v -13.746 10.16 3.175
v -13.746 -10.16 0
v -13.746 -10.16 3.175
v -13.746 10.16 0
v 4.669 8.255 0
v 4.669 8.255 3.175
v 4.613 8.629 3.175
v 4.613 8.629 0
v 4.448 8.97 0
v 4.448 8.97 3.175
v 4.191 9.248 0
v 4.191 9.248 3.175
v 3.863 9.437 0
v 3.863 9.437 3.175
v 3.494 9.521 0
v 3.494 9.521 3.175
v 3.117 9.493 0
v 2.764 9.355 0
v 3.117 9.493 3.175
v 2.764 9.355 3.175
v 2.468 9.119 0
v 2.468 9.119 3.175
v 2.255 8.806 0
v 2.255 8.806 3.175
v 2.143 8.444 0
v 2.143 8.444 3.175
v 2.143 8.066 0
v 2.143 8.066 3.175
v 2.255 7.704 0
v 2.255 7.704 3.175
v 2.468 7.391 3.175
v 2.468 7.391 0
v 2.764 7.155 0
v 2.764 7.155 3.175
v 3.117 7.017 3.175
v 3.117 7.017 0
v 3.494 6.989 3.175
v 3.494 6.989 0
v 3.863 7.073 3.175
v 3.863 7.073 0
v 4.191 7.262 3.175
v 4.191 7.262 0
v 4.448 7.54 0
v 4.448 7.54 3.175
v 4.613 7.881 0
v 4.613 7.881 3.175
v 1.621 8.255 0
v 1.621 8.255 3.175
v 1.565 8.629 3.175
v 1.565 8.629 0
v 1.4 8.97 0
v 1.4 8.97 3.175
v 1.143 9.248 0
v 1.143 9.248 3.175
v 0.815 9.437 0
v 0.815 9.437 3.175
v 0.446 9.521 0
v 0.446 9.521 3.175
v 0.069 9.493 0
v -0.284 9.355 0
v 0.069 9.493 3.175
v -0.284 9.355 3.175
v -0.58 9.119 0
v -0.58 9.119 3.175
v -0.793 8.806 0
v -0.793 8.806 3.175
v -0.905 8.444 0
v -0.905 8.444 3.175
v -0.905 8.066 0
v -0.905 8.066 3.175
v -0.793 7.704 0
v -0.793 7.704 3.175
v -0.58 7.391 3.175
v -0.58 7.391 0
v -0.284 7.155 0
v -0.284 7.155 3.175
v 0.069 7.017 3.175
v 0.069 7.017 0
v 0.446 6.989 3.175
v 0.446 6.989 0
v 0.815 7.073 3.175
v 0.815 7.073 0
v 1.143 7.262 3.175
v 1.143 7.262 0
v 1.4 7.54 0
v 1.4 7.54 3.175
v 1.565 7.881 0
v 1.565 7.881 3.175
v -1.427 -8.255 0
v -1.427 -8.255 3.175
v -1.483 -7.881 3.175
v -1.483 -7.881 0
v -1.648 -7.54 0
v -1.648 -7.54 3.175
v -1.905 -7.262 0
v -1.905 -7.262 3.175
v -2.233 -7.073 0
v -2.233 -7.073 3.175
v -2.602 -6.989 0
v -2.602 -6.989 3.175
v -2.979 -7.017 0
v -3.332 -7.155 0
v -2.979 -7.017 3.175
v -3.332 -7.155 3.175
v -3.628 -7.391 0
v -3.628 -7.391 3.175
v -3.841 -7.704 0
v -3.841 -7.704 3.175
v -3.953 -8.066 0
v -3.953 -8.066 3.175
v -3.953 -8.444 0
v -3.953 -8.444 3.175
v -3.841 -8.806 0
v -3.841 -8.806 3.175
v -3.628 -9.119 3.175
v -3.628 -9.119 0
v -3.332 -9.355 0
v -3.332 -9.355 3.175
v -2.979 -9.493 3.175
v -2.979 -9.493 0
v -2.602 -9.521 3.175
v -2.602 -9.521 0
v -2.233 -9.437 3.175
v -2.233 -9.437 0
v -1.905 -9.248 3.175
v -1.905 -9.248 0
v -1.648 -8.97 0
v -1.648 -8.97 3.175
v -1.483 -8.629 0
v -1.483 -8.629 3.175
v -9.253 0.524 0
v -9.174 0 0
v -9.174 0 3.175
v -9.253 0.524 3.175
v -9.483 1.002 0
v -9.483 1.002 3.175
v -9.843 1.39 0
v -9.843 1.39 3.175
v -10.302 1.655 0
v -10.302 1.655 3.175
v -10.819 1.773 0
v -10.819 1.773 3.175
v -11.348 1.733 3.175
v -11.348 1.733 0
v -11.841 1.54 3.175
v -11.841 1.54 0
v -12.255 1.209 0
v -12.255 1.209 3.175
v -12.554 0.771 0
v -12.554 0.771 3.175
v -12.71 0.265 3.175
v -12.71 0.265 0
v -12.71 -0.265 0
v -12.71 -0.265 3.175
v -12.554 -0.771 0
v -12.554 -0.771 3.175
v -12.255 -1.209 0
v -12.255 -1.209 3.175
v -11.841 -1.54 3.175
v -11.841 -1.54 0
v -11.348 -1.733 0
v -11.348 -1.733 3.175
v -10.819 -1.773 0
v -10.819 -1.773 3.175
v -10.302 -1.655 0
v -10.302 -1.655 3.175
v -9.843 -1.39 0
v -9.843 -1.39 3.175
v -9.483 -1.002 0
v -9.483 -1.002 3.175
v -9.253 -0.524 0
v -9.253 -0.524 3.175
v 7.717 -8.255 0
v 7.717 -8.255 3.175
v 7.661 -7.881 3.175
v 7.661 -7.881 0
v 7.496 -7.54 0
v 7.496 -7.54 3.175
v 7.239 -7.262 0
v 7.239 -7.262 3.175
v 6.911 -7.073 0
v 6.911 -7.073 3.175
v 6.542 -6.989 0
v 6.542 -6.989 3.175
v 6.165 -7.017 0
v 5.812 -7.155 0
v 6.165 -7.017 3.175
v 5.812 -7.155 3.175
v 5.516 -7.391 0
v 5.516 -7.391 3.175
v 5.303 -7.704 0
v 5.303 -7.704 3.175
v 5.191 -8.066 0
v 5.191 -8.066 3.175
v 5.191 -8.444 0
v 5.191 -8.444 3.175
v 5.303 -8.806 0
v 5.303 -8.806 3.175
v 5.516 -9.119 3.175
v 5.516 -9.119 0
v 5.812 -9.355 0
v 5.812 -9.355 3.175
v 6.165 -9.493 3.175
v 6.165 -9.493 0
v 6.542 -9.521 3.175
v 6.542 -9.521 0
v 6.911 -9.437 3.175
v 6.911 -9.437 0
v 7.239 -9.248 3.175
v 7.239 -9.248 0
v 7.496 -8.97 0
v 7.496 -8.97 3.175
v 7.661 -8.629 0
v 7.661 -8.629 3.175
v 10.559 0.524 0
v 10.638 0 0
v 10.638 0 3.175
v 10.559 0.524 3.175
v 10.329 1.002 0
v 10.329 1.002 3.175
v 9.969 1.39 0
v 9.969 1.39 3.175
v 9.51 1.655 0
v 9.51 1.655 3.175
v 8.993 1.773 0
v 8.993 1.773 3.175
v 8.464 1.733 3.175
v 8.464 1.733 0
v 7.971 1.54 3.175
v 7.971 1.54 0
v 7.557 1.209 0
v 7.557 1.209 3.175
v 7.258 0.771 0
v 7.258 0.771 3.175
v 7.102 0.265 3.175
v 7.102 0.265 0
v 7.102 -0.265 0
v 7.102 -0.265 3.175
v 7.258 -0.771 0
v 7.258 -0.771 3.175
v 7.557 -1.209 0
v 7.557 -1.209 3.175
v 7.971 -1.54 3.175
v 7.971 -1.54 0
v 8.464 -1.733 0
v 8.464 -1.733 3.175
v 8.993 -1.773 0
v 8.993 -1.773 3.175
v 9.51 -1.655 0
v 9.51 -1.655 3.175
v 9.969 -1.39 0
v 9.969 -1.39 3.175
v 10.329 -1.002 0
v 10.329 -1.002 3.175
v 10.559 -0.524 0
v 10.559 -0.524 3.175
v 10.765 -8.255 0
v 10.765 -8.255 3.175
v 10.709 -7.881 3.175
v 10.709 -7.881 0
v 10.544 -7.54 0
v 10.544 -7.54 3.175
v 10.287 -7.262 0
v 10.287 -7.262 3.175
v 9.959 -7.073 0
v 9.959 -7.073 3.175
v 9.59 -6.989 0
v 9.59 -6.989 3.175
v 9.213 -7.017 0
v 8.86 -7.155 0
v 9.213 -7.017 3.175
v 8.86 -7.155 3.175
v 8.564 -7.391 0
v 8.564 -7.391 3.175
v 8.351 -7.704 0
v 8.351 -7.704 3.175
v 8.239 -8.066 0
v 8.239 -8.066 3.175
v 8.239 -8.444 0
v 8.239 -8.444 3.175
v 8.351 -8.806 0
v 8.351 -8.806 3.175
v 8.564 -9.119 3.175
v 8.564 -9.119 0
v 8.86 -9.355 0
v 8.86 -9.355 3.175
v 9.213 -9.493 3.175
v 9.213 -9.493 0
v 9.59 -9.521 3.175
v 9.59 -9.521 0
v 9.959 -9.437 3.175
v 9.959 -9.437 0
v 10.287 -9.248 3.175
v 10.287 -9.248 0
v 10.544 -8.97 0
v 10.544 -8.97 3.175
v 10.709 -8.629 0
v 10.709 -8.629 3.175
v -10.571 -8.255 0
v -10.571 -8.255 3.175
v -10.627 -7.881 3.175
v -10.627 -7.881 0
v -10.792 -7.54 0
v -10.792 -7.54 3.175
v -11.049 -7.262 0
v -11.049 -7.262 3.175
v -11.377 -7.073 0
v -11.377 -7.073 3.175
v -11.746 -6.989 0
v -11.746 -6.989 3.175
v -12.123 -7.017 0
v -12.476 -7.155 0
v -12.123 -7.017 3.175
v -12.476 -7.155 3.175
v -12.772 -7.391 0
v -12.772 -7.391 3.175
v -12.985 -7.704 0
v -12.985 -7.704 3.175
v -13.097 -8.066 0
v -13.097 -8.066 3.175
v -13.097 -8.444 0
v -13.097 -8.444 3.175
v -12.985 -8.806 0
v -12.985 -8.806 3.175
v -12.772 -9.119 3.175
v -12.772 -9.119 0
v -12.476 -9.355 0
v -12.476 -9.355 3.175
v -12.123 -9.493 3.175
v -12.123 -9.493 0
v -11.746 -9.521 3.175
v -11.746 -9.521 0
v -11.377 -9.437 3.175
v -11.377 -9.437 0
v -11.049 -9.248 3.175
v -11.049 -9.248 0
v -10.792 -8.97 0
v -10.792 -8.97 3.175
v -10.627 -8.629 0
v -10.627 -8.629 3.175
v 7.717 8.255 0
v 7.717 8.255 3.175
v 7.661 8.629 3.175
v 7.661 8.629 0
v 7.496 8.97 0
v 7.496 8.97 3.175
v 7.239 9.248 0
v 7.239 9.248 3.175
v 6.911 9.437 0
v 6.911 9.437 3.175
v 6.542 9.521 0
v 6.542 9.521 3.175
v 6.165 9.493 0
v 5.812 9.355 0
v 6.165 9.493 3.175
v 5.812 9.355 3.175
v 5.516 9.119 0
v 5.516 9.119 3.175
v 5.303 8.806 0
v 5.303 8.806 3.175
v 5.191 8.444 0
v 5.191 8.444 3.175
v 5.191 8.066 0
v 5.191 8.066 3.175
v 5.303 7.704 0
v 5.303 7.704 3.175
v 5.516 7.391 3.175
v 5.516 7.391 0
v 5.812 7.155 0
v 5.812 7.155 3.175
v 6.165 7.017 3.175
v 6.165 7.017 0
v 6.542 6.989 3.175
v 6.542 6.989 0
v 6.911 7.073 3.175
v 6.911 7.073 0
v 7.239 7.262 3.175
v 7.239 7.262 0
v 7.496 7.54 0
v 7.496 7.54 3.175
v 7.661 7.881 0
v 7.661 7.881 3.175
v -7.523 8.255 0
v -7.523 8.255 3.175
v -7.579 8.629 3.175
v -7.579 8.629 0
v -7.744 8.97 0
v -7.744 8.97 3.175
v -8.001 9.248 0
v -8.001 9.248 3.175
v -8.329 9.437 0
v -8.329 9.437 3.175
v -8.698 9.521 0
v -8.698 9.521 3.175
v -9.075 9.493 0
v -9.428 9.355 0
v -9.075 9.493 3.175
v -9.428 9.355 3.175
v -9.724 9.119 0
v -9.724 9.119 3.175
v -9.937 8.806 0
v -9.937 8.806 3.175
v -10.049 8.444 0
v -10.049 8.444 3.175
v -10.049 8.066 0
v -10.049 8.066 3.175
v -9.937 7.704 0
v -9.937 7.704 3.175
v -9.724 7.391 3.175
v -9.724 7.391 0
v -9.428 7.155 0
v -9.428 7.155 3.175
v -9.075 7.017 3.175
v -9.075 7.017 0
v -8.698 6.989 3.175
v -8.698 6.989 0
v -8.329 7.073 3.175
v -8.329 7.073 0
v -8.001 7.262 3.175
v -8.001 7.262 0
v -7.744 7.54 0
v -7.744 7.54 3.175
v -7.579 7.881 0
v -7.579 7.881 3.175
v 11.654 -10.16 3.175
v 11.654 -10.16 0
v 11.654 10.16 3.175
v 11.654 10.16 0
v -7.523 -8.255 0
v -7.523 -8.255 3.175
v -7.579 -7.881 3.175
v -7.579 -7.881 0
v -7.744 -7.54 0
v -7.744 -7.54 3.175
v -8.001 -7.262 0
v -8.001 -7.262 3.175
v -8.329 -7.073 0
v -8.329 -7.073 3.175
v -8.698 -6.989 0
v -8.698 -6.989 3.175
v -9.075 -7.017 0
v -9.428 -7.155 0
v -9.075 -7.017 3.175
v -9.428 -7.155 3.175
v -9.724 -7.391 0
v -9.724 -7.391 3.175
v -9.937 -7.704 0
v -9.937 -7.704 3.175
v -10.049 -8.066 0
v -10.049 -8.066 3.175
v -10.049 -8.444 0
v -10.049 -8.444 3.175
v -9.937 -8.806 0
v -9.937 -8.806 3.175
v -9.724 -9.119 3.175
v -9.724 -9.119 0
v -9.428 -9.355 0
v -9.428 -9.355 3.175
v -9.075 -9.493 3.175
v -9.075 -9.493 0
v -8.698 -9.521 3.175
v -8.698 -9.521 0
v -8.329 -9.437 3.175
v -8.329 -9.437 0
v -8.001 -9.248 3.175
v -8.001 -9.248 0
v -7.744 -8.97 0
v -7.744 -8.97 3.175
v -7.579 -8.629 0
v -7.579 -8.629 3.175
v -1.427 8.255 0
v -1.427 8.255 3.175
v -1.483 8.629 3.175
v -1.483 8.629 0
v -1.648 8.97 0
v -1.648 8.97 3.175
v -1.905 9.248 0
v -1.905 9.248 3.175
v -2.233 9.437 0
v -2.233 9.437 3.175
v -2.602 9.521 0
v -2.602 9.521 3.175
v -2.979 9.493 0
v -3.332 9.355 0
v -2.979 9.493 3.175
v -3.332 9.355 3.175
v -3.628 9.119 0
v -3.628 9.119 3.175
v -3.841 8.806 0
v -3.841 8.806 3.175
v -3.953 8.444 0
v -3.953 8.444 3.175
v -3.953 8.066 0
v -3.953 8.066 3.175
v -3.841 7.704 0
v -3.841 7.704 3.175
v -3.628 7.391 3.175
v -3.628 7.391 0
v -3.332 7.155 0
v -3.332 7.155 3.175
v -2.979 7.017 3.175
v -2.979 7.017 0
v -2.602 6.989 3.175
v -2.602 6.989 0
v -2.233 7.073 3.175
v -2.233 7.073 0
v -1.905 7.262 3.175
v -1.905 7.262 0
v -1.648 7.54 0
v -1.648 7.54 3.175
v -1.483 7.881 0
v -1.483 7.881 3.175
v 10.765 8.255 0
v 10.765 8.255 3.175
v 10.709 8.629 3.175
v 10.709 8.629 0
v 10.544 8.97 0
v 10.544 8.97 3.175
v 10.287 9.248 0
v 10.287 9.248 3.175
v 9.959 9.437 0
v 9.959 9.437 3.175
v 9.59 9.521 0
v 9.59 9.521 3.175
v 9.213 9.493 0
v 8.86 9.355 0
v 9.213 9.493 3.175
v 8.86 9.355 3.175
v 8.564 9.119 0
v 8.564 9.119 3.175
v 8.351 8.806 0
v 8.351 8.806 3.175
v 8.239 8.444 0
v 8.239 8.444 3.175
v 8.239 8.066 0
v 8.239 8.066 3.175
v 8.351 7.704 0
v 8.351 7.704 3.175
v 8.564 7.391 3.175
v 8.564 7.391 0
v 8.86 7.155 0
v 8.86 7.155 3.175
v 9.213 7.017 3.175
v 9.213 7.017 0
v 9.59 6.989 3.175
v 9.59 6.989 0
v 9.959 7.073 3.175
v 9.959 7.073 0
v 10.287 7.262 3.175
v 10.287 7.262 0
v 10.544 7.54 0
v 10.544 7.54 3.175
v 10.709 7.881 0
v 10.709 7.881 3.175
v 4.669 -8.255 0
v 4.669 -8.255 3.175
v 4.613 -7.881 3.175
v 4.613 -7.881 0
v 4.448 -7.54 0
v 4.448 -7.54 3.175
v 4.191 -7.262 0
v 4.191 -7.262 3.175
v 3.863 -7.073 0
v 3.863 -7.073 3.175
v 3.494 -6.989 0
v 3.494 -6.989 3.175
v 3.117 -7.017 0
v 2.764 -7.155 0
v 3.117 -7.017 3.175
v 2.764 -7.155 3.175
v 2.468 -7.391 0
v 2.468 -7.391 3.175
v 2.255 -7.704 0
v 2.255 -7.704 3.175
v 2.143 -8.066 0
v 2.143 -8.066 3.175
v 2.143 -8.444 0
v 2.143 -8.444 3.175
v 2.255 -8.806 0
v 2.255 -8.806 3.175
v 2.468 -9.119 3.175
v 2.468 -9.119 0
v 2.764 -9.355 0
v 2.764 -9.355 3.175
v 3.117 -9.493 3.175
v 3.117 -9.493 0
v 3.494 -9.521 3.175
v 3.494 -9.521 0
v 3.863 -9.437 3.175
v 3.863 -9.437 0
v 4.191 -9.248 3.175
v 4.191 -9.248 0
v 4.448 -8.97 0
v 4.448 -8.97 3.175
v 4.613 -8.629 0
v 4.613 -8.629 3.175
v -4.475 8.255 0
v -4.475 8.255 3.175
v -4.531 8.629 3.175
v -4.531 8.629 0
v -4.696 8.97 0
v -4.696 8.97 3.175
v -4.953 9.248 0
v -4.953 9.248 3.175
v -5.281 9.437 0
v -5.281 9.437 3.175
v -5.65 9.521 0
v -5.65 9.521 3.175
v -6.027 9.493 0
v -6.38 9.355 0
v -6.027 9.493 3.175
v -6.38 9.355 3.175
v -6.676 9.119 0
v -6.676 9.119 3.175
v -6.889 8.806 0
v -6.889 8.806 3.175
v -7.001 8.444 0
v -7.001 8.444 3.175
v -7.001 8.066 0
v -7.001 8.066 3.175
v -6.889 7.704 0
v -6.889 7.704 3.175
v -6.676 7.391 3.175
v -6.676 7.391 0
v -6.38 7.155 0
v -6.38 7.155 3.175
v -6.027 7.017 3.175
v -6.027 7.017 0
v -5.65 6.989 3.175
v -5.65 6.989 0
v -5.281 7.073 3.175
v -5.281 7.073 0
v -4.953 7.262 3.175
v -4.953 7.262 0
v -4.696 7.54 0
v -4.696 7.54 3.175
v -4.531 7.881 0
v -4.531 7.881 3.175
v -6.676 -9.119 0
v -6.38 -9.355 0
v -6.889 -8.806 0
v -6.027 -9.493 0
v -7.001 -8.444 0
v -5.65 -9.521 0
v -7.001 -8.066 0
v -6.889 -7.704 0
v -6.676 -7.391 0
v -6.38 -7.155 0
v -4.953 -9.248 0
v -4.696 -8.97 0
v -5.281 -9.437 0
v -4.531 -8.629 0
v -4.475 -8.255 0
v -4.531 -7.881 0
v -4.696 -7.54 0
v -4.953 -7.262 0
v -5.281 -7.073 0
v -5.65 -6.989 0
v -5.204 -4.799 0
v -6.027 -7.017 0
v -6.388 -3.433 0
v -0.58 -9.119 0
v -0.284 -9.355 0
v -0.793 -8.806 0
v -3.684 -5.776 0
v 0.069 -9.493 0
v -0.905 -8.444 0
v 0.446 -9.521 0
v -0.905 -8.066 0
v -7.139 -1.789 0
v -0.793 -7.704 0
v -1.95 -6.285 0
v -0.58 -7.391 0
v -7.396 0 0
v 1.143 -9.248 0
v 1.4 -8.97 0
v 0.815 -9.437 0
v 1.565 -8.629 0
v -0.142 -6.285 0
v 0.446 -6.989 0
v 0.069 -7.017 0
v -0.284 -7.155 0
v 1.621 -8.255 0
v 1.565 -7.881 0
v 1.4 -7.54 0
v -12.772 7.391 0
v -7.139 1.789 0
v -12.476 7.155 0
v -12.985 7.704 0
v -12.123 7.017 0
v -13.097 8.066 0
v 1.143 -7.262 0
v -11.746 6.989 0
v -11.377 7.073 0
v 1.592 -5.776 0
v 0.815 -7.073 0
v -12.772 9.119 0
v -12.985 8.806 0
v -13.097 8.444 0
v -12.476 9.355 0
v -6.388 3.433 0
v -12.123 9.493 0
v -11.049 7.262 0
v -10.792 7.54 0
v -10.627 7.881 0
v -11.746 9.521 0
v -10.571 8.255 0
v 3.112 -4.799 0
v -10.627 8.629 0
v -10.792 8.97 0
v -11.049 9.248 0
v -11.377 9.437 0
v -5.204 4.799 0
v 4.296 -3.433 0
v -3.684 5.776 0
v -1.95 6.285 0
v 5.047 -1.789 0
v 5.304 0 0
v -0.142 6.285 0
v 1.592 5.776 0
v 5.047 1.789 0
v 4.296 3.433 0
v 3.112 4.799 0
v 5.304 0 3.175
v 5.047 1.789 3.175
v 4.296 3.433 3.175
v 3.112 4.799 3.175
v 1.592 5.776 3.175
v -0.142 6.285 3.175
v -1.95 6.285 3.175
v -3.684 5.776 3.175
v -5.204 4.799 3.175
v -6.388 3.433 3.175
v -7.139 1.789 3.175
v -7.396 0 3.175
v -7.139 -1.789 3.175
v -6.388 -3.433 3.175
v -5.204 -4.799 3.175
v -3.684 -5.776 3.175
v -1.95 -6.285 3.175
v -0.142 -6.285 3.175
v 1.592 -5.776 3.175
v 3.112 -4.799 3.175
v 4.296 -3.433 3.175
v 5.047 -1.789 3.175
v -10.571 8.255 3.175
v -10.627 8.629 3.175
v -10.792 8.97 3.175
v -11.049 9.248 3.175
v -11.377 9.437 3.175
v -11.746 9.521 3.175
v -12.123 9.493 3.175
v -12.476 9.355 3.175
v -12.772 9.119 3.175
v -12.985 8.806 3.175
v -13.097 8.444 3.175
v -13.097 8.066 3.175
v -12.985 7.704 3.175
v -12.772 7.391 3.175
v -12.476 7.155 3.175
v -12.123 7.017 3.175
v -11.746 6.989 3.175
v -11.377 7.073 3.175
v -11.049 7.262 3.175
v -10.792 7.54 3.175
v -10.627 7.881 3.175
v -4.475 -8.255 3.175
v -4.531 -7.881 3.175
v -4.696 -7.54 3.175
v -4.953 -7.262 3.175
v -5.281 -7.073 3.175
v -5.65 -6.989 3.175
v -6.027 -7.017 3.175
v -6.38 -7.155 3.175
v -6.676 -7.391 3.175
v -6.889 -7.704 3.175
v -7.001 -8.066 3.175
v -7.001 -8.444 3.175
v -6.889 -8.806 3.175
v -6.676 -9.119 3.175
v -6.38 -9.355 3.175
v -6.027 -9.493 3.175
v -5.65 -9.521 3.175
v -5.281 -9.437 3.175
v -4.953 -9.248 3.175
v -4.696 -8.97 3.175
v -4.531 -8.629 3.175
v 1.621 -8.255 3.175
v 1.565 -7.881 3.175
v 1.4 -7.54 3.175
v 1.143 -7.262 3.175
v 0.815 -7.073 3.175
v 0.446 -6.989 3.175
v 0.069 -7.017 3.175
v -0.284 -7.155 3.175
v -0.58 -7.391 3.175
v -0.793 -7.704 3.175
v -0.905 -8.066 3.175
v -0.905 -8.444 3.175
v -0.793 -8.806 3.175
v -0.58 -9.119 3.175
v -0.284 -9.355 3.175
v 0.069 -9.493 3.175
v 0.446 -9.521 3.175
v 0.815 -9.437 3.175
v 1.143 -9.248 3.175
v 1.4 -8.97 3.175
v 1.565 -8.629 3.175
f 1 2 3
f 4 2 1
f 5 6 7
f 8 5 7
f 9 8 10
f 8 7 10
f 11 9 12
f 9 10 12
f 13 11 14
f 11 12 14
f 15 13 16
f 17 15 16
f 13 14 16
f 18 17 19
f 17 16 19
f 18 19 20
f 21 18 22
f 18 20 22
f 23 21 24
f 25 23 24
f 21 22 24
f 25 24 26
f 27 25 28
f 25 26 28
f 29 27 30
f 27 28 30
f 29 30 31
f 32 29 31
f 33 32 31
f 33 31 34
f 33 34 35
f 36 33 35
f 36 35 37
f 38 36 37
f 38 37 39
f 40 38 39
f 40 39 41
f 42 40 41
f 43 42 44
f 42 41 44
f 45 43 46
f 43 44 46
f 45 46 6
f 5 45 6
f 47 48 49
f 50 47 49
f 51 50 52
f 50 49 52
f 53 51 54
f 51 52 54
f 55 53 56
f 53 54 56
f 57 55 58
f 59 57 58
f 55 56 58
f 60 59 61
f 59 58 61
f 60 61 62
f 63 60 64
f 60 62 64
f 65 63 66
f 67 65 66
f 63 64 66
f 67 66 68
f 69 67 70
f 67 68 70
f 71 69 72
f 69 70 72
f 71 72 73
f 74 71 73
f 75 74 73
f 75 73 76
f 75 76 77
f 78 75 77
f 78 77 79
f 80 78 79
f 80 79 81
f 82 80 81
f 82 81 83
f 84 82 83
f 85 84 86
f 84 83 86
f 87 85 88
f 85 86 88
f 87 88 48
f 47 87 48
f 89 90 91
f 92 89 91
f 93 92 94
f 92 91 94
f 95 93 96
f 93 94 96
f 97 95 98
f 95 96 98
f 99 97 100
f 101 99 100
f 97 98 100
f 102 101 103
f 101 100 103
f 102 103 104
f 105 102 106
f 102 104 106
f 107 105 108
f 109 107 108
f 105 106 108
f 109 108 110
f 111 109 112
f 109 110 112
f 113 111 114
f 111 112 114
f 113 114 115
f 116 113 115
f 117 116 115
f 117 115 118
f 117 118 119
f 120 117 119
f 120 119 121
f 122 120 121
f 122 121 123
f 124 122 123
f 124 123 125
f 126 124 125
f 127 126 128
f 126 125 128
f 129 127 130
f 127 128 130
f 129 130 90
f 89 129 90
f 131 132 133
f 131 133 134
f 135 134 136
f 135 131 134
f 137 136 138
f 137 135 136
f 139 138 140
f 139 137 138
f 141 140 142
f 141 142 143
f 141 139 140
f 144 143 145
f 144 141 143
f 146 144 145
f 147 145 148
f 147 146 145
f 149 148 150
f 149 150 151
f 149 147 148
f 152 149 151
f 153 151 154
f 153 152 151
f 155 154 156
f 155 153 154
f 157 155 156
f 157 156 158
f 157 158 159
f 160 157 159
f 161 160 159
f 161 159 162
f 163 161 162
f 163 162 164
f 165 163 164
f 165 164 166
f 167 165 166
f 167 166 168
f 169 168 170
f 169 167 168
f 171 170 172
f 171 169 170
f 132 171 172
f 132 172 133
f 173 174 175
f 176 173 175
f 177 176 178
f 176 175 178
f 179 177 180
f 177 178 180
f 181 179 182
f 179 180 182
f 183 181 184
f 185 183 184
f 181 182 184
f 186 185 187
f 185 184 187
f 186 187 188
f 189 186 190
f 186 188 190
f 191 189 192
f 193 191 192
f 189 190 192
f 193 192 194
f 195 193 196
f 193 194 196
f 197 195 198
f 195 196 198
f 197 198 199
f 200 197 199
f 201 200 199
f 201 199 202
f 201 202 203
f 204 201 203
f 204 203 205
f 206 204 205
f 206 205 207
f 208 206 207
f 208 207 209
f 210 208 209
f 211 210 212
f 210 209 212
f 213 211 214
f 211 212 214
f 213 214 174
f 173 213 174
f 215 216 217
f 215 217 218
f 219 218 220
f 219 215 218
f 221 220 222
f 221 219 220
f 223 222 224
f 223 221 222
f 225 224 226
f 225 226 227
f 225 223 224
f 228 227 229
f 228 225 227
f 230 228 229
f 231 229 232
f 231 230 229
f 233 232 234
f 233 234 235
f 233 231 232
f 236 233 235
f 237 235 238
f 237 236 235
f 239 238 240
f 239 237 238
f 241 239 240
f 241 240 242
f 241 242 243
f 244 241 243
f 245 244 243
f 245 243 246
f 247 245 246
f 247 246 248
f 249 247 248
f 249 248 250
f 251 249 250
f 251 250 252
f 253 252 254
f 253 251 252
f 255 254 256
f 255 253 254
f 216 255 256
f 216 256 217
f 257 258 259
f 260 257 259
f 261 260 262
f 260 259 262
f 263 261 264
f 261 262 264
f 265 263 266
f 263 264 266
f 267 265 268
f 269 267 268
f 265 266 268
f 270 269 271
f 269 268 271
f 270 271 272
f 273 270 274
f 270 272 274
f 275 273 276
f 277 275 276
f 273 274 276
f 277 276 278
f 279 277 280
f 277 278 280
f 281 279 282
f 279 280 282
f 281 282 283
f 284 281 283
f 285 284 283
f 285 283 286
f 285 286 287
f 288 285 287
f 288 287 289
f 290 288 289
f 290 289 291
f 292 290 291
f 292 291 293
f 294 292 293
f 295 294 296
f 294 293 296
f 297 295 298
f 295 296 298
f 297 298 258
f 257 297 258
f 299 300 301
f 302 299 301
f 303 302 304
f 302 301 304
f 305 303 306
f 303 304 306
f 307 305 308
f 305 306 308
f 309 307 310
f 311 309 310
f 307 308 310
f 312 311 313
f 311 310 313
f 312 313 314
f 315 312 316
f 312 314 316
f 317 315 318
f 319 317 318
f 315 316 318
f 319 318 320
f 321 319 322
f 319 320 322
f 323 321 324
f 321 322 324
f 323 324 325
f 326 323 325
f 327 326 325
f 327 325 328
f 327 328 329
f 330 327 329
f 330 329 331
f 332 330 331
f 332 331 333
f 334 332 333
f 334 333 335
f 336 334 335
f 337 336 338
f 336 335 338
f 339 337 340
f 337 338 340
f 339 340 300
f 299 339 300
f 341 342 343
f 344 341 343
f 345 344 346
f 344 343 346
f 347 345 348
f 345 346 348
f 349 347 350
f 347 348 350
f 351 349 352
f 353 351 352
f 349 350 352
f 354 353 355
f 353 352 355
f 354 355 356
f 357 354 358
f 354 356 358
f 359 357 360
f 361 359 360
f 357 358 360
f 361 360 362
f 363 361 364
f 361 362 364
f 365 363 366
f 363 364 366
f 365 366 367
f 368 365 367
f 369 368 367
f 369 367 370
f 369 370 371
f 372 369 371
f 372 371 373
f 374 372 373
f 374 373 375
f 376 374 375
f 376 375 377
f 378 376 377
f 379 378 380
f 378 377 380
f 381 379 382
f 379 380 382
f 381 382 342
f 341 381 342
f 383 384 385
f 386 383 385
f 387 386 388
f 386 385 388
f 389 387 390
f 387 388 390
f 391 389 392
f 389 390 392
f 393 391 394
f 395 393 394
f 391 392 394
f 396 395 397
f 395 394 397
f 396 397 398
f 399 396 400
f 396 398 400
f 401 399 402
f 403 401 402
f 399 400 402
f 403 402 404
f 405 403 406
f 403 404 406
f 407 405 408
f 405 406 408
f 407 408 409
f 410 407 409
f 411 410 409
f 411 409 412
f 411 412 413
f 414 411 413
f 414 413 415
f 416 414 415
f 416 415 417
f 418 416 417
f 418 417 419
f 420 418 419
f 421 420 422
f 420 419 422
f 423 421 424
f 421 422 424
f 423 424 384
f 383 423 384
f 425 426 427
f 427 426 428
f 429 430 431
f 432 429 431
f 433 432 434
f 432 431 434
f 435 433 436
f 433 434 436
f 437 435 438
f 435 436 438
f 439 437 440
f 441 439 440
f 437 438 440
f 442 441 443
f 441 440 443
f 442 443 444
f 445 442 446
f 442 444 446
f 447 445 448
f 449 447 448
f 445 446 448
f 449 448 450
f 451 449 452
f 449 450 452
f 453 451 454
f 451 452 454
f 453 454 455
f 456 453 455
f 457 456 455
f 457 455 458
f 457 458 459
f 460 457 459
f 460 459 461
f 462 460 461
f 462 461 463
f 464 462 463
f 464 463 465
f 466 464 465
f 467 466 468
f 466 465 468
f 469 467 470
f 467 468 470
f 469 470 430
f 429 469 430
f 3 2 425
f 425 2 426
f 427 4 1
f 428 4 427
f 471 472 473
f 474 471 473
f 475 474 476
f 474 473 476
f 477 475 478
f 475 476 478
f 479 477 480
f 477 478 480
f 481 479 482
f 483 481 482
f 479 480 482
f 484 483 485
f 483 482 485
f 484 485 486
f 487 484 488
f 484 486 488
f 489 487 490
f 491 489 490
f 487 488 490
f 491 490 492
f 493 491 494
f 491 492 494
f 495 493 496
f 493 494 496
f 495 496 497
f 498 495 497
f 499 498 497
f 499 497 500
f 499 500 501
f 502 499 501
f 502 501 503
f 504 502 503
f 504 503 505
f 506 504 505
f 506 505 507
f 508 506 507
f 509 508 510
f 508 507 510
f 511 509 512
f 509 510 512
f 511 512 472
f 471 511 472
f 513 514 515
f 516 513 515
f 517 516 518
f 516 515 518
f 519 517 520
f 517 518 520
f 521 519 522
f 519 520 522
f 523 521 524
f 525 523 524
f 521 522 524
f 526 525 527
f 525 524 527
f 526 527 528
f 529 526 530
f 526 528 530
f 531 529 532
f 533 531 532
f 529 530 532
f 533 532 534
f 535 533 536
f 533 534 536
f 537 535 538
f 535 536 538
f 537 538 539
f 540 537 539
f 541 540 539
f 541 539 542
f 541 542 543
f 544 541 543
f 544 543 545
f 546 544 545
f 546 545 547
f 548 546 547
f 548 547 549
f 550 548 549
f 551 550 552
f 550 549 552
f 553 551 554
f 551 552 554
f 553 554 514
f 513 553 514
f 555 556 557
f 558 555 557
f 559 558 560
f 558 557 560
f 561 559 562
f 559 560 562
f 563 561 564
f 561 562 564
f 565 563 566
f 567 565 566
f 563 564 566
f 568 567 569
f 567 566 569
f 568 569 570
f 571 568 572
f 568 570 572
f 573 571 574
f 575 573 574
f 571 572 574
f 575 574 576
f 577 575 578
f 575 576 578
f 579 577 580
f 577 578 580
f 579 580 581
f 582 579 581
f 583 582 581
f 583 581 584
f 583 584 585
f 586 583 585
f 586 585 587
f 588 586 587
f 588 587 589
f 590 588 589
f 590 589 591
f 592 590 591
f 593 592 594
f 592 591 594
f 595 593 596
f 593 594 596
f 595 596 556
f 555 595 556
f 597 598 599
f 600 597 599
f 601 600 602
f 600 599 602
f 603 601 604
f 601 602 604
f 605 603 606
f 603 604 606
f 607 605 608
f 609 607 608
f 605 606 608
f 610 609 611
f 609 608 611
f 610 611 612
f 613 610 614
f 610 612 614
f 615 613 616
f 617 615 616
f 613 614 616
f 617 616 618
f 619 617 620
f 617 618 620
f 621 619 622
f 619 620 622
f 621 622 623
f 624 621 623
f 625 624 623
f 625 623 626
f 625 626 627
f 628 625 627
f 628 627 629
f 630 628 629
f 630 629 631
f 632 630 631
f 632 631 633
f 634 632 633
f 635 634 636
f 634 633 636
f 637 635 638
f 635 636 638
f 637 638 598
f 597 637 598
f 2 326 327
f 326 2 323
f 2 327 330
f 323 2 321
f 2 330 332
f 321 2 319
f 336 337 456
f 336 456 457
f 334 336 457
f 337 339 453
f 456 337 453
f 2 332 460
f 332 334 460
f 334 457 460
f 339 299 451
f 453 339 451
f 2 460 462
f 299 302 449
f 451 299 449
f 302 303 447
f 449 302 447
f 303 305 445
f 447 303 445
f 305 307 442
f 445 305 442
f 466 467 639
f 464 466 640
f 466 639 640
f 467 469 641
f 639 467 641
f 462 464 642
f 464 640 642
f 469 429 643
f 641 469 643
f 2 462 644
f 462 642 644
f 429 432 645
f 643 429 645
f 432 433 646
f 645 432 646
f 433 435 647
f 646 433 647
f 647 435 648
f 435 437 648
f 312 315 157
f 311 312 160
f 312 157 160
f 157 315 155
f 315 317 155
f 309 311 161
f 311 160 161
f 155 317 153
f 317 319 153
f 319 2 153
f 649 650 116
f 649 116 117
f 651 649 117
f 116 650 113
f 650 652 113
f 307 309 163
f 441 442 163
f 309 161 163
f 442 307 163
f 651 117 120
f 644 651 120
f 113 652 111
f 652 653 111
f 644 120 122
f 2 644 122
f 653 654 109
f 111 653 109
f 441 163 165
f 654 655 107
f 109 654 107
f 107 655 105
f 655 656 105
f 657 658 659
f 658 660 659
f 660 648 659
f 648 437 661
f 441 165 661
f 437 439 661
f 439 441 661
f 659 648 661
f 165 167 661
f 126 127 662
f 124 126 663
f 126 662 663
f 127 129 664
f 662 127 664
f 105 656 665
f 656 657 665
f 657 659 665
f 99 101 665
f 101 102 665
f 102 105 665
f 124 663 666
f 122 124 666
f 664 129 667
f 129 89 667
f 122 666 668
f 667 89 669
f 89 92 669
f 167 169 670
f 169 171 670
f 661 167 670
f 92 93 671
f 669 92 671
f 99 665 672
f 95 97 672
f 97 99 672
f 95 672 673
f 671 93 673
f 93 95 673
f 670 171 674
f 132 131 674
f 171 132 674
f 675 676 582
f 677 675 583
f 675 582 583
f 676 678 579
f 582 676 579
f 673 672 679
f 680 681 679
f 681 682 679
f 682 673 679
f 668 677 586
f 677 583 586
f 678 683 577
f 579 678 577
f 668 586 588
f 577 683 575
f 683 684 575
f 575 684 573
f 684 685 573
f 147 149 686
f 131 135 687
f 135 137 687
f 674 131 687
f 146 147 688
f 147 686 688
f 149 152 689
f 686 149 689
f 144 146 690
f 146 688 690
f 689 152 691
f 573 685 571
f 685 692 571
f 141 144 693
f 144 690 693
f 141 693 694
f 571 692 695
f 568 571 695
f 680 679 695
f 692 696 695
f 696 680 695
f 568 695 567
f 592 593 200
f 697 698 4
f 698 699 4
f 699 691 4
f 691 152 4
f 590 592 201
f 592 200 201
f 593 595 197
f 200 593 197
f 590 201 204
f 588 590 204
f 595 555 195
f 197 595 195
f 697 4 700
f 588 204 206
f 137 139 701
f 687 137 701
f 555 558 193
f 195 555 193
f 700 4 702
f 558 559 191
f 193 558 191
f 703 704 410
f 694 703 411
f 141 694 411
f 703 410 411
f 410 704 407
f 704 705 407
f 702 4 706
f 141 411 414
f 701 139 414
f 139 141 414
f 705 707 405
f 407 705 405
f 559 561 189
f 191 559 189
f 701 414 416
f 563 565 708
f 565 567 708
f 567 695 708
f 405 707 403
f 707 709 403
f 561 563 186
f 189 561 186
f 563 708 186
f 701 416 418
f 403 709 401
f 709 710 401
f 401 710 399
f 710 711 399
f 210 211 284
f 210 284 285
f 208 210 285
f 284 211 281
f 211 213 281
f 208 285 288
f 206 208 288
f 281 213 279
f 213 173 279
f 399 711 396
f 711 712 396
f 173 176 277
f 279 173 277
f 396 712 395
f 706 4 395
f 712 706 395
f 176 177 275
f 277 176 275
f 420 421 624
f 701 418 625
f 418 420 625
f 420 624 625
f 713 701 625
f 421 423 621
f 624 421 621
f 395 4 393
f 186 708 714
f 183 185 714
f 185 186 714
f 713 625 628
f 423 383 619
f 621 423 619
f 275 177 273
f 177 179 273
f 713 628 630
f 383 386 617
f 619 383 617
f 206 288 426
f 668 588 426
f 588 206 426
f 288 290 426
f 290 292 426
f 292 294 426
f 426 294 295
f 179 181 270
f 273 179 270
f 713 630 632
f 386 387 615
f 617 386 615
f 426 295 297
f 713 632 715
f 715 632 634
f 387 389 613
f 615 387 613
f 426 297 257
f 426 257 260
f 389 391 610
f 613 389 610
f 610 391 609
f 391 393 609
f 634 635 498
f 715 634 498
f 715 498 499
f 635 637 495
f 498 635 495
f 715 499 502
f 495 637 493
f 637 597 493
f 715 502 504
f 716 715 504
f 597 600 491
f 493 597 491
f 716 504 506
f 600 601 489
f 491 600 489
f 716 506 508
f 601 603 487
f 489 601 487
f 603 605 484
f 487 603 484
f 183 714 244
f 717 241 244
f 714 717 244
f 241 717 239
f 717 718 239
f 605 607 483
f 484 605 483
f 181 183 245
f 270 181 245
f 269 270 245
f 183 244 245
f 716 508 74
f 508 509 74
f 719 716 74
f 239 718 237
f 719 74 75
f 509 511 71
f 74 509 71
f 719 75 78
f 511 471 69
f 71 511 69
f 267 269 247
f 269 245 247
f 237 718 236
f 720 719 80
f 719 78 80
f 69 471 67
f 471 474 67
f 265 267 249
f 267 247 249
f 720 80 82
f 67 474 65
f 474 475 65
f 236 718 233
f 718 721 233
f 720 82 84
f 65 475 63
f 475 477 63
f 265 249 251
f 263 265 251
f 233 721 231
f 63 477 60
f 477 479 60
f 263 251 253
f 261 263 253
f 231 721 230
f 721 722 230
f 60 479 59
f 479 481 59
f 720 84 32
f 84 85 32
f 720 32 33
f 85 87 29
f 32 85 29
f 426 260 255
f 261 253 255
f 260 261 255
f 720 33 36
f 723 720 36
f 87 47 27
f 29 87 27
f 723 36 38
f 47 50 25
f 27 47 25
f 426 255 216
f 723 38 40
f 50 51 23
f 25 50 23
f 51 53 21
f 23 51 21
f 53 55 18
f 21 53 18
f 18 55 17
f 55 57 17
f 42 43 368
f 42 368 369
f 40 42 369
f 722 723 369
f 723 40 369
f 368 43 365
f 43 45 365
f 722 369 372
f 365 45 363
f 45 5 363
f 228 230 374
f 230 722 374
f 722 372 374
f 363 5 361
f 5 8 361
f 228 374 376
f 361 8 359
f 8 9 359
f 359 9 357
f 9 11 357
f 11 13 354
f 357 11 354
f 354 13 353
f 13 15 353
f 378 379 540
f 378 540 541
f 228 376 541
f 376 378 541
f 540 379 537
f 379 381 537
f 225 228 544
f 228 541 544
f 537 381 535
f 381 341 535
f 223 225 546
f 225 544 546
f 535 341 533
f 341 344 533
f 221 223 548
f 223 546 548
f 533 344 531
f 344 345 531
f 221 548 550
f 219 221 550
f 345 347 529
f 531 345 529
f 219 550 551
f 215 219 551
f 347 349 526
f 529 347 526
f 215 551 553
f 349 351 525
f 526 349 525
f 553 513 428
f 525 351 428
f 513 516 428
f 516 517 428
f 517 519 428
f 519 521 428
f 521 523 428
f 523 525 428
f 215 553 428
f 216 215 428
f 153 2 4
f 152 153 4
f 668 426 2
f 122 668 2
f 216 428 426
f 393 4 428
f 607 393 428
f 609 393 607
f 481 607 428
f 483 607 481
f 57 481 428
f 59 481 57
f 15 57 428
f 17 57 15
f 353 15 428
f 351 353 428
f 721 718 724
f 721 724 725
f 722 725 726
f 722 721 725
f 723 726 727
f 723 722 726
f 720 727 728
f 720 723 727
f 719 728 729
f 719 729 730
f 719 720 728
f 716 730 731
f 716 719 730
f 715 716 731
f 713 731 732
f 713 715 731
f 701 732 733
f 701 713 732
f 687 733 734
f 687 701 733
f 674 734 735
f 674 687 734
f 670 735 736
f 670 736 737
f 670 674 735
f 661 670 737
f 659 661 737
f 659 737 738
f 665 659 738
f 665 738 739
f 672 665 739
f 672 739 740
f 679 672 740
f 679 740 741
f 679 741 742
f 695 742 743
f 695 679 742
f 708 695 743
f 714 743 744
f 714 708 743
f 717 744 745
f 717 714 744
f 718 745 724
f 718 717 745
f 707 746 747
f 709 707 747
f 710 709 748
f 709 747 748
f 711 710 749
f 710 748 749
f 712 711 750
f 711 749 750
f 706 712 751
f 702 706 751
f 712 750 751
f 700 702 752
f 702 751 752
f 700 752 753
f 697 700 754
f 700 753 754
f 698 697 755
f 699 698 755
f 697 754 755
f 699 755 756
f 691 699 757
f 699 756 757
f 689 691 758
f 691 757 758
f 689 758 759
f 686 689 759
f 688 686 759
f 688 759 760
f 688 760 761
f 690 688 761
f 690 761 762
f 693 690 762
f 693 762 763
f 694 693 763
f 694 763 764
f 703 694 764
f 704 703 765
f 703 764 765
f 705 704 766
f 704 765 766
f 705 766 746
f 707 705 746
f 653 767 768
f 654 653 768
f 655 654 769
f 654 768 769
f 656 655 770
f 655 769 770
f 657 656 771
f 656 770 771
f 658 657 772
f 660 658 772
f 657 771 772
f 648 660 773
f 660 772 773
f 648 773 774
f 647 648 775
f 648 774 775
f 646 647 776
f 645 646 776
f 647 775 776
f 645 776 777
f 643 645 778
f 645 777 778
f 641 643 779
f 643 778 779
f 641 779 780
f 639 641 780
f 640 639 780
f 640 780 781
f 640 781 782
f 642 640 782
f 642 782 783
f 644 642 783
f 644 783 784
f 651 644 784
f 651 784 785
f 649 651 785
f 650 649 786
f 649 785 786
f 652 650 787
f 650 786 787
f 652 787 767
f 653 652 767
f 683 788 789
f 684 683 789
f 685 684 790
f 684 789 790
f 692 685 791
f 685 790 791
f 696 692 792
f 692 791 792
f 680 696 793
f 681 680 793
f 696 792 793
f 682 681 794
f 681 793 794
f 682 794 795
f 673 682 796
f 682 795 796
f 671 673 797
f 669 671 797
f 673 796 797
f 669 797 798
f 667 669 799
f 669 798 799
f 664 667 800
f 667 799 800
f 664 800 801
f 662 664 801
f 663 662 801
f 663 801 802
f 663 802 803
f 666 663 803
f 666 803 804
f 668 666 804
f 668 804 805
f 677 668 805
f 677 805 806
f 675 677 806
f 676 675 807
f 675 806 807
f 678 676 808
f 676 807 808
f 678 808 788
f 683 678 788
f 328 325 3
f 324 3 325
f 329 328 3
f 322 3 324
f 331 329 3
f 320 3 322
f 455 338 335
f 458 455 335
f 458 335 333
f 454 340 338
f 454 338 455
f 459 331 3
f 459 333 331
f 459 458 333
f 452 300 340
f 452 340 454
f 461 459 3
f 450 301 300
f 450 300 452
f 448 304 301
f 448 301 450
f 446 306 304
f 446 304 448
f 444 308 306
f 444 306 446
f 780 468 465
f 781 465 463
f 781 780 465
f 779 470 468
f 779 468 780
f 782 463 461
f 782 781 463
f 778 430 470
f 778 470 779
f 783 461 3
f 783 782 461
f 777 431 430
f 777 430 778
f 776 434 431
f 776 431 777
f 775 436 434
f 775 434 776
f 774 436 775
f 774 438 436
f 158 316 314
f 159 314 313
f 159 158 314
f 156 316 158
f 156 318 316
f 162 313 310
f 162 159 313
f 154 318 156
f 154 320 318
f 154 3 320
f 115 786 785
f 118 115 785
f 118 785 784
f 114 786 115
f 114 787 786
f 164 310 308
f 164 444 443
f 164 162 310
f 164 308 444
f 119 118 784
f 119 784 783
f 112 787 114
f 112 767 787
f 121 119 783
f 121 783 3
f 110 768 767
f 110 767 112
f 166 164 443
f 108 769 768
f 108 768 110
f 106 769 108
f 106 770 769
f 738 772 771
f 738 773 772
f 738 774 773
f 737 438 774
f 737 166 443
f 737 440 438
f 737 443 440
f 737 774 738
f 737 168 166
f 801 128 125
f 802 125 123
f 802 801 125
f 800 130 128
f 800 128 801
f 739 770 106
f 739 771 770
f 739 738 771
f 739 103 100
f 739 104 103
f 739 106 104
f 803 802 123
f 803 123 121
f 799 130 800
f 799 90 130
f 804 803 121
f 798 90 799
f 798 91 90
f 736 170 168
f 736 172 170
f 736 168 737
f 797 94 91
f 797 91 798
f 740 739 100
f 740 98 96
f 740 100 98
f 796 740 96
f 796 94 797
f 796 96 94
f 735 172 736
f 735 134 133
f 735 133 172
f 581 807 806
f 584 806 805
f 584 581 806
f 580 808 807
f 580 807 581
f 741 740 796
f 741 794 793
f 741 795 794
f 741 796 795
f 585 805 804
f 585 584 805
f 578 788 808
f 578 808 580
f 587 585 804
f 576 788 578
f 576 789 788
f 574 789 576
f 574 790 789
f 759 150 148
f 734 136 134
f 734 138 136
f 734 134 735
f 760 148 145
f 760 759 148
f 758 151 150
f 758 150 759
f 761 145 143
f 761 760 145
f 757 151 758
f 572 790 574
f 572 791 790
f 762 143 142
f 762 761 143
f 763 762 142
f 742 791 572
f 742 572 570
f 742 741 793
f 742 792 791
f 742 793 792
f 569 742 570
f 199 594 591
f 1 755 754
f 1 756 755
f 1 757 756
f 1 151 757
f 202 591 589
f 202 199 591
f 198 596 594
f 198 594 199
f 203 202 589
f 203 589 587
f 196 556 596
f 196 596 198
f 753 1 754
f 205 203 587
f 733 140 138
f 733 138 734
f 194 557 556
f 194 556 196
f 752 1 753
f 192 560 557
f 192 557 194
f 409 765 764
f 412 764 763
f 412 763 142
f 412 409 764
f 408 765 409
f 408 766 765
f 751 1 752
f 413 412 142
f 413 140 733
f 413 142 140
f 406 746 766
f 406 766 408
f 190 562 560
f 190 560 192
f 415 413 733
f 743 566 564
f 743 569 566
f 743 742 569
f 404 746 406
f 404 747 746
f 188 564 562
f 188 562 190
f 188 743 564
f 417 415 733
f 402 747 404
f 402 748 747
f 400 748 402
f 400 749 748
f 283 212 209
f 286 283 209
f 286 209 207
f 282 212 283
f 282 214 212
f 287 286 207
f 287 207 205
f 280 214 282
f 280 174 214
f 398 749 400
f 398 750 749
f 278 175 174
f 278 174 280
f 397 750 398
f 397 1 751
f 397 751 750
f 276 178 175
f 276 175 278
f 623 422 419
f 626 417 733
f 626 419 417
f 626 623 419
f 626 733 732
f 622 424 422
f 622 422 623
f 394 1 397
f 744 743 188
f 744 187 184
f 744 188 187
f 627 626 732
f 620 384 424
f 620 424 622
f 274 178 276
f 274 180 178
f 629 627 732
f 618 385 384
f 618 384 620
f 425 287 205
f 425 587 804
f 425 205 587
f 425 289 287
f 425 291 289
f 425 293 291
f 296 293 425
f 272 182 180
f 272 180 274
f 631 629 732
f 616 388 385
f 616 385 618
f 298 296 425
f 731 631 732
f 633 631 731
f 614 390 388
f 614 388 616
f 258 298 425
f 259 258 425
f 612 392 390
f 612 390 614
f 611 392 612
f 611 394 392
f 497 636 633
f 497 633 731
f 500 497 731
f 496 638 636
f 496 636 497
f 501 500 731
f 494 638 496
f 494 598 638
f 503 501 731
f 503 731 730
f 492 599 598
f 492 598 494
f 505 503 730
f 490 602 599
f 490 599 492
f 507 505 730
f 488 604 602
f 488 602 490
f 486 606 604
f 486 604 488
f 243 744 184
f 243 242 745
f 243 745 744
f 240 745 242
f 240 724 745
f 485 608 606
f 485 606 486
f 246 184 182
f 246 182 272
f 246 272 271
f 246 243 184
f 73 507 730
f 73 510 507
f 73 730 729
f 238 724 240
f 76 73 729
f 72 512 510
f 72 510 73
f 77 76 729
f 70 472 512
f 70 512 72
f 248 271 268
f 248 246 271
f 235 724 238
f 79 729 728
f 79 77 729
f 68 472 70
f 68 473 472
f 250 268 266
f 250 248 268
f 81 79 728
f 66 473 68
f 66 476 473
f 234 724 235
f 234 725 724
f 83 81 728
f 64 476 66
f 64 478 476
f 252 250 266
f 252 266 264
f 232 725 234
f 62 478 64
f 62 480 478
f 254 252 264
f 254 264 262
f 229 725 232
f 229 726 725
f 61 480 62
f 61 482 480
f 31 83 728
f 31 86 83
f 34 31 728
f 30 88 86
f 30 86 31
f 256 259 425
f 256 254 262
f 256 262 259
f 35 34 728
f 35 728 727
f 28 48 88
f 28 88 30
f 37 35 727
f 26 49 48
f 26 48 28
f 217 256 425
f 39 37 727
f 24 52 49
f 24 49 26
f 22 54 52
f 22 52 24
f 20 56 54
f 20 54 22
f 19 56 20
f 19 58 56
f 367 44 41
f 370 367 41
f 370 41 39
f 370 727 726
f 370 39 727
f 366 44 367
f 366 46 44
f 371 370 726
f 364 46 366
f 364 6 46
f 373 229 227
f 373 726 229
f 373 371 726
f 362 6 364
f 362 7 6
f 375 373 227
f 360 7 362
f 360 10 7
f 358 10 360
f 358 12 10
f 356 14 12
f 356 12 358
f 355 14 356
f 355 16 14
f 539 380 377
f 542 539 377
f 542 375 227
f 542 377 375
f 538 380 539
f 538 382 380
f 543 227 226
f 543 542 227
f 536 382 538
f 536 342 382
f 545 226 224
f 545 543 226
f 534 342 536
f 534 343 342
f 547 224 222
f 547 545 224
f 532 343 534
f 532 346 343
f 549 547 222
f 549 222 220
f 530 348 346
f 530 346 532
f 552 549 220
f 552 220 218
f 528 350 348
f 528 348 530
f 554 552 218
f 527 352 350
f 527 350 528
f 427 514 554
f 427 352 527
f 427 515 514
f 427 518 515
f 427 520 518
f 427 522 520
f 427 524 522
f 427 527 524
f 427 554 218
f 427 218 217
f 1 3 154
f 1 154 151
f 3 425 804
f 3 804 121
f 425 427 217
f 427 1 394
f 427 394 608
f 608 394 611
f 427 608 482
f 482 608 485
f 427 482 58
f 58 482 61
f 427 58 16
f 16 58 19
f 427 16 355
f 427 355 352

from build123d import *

# Parameters (mm, degrees)
SKETCH2_W           = 25.4
SKETCH2_H           = 20.32
SKETCH2_R           = 6.35
SKETCH2_R_2         = 1.778
BOSS_EXTRUDE1_DEPTH = 3.175
SKETCH4_R           = 1.27
CUT_EXTRUDE1_DEPTH  = 3.175


with BuildPart() as part:
    # Sketch2 → Boss-Extrude1 (new body)
    with BuildSketch(Plane.XY):
        with Locations((-1.045882353, 0)):
            Rectangle(SKETCH2_W, SKETCH2_H)
        with Locations((-1.045882353, 0)):
            Circle(SKETCH2_R, mode=Mode.SUBTRACT)
        with Locations((-10.951882353, 0)):
            Circle(SKETCH2_R_2, mode=Mode.SUBTRACT)
        with Locations((8.860117647, 0)):
            Circle(SKETCH2_R_2, mode=Mode.SUBTRACT)
    extrude(amount=BOSS_EXTRUDE1_DEPTH)

    # Sketch4 → Cut-Extrude1 (cut)
    with BuildSketch(Plane.XY.offset(3.175)):
        with Locations((-11.840882353, 8.255)):
            Circle(SKETCH4_R)
        with Locations((-8.792882353, 8.255)):
            Circle(SKETCH4_R)
        with Locations((-5.744882353, 8.255)):
            Circle(SKETCH4_R)
        with Locations((-2.696882353, 8.255)):
            Circle(SKETCH4_R)
        with Locations((0.351117647, 8.255)):
            Circle(SKETCH4_R)
        with Locations((3.399117647, 8.255)):
            Circle(SKETCH4_R)
        with Locations((6.447117647, 8.255)):
            Circle(SKETCH4_R)
        with Locations((9.495117647, 8.255)):
            Circle(SKETCH4_R)
        with Locations((-11.840882353, -8.255)):
            Circle(SKETCH4_R)
        with Locations((-8.792882353, -8.255)):
            Circle(SKETCH4_R)
        with Locations((-5.744882353, -8.255)):
            Circle(SKETCH4_R)
        with Locations((-2.696882353, -8.255)):
            Circle(SKETCH4_R)
        with Locations((0.351117647, -8.255)):
            Circle(SKETCH4_R)
        with Locations((3.399117647, -8.255)):
            Circle(SKETCH4_R)
        with Locations((6.447117647, -8.255)):
            Circle(SKETCH4_R)
        with Locations((9.495117647, -8.255)):
            Circle(SKETCH4_R)
    extrude(amount=-CUT_EXTRUDE1_DEPTH, mode=Mode.SUBTRACT)


solid = part.part
